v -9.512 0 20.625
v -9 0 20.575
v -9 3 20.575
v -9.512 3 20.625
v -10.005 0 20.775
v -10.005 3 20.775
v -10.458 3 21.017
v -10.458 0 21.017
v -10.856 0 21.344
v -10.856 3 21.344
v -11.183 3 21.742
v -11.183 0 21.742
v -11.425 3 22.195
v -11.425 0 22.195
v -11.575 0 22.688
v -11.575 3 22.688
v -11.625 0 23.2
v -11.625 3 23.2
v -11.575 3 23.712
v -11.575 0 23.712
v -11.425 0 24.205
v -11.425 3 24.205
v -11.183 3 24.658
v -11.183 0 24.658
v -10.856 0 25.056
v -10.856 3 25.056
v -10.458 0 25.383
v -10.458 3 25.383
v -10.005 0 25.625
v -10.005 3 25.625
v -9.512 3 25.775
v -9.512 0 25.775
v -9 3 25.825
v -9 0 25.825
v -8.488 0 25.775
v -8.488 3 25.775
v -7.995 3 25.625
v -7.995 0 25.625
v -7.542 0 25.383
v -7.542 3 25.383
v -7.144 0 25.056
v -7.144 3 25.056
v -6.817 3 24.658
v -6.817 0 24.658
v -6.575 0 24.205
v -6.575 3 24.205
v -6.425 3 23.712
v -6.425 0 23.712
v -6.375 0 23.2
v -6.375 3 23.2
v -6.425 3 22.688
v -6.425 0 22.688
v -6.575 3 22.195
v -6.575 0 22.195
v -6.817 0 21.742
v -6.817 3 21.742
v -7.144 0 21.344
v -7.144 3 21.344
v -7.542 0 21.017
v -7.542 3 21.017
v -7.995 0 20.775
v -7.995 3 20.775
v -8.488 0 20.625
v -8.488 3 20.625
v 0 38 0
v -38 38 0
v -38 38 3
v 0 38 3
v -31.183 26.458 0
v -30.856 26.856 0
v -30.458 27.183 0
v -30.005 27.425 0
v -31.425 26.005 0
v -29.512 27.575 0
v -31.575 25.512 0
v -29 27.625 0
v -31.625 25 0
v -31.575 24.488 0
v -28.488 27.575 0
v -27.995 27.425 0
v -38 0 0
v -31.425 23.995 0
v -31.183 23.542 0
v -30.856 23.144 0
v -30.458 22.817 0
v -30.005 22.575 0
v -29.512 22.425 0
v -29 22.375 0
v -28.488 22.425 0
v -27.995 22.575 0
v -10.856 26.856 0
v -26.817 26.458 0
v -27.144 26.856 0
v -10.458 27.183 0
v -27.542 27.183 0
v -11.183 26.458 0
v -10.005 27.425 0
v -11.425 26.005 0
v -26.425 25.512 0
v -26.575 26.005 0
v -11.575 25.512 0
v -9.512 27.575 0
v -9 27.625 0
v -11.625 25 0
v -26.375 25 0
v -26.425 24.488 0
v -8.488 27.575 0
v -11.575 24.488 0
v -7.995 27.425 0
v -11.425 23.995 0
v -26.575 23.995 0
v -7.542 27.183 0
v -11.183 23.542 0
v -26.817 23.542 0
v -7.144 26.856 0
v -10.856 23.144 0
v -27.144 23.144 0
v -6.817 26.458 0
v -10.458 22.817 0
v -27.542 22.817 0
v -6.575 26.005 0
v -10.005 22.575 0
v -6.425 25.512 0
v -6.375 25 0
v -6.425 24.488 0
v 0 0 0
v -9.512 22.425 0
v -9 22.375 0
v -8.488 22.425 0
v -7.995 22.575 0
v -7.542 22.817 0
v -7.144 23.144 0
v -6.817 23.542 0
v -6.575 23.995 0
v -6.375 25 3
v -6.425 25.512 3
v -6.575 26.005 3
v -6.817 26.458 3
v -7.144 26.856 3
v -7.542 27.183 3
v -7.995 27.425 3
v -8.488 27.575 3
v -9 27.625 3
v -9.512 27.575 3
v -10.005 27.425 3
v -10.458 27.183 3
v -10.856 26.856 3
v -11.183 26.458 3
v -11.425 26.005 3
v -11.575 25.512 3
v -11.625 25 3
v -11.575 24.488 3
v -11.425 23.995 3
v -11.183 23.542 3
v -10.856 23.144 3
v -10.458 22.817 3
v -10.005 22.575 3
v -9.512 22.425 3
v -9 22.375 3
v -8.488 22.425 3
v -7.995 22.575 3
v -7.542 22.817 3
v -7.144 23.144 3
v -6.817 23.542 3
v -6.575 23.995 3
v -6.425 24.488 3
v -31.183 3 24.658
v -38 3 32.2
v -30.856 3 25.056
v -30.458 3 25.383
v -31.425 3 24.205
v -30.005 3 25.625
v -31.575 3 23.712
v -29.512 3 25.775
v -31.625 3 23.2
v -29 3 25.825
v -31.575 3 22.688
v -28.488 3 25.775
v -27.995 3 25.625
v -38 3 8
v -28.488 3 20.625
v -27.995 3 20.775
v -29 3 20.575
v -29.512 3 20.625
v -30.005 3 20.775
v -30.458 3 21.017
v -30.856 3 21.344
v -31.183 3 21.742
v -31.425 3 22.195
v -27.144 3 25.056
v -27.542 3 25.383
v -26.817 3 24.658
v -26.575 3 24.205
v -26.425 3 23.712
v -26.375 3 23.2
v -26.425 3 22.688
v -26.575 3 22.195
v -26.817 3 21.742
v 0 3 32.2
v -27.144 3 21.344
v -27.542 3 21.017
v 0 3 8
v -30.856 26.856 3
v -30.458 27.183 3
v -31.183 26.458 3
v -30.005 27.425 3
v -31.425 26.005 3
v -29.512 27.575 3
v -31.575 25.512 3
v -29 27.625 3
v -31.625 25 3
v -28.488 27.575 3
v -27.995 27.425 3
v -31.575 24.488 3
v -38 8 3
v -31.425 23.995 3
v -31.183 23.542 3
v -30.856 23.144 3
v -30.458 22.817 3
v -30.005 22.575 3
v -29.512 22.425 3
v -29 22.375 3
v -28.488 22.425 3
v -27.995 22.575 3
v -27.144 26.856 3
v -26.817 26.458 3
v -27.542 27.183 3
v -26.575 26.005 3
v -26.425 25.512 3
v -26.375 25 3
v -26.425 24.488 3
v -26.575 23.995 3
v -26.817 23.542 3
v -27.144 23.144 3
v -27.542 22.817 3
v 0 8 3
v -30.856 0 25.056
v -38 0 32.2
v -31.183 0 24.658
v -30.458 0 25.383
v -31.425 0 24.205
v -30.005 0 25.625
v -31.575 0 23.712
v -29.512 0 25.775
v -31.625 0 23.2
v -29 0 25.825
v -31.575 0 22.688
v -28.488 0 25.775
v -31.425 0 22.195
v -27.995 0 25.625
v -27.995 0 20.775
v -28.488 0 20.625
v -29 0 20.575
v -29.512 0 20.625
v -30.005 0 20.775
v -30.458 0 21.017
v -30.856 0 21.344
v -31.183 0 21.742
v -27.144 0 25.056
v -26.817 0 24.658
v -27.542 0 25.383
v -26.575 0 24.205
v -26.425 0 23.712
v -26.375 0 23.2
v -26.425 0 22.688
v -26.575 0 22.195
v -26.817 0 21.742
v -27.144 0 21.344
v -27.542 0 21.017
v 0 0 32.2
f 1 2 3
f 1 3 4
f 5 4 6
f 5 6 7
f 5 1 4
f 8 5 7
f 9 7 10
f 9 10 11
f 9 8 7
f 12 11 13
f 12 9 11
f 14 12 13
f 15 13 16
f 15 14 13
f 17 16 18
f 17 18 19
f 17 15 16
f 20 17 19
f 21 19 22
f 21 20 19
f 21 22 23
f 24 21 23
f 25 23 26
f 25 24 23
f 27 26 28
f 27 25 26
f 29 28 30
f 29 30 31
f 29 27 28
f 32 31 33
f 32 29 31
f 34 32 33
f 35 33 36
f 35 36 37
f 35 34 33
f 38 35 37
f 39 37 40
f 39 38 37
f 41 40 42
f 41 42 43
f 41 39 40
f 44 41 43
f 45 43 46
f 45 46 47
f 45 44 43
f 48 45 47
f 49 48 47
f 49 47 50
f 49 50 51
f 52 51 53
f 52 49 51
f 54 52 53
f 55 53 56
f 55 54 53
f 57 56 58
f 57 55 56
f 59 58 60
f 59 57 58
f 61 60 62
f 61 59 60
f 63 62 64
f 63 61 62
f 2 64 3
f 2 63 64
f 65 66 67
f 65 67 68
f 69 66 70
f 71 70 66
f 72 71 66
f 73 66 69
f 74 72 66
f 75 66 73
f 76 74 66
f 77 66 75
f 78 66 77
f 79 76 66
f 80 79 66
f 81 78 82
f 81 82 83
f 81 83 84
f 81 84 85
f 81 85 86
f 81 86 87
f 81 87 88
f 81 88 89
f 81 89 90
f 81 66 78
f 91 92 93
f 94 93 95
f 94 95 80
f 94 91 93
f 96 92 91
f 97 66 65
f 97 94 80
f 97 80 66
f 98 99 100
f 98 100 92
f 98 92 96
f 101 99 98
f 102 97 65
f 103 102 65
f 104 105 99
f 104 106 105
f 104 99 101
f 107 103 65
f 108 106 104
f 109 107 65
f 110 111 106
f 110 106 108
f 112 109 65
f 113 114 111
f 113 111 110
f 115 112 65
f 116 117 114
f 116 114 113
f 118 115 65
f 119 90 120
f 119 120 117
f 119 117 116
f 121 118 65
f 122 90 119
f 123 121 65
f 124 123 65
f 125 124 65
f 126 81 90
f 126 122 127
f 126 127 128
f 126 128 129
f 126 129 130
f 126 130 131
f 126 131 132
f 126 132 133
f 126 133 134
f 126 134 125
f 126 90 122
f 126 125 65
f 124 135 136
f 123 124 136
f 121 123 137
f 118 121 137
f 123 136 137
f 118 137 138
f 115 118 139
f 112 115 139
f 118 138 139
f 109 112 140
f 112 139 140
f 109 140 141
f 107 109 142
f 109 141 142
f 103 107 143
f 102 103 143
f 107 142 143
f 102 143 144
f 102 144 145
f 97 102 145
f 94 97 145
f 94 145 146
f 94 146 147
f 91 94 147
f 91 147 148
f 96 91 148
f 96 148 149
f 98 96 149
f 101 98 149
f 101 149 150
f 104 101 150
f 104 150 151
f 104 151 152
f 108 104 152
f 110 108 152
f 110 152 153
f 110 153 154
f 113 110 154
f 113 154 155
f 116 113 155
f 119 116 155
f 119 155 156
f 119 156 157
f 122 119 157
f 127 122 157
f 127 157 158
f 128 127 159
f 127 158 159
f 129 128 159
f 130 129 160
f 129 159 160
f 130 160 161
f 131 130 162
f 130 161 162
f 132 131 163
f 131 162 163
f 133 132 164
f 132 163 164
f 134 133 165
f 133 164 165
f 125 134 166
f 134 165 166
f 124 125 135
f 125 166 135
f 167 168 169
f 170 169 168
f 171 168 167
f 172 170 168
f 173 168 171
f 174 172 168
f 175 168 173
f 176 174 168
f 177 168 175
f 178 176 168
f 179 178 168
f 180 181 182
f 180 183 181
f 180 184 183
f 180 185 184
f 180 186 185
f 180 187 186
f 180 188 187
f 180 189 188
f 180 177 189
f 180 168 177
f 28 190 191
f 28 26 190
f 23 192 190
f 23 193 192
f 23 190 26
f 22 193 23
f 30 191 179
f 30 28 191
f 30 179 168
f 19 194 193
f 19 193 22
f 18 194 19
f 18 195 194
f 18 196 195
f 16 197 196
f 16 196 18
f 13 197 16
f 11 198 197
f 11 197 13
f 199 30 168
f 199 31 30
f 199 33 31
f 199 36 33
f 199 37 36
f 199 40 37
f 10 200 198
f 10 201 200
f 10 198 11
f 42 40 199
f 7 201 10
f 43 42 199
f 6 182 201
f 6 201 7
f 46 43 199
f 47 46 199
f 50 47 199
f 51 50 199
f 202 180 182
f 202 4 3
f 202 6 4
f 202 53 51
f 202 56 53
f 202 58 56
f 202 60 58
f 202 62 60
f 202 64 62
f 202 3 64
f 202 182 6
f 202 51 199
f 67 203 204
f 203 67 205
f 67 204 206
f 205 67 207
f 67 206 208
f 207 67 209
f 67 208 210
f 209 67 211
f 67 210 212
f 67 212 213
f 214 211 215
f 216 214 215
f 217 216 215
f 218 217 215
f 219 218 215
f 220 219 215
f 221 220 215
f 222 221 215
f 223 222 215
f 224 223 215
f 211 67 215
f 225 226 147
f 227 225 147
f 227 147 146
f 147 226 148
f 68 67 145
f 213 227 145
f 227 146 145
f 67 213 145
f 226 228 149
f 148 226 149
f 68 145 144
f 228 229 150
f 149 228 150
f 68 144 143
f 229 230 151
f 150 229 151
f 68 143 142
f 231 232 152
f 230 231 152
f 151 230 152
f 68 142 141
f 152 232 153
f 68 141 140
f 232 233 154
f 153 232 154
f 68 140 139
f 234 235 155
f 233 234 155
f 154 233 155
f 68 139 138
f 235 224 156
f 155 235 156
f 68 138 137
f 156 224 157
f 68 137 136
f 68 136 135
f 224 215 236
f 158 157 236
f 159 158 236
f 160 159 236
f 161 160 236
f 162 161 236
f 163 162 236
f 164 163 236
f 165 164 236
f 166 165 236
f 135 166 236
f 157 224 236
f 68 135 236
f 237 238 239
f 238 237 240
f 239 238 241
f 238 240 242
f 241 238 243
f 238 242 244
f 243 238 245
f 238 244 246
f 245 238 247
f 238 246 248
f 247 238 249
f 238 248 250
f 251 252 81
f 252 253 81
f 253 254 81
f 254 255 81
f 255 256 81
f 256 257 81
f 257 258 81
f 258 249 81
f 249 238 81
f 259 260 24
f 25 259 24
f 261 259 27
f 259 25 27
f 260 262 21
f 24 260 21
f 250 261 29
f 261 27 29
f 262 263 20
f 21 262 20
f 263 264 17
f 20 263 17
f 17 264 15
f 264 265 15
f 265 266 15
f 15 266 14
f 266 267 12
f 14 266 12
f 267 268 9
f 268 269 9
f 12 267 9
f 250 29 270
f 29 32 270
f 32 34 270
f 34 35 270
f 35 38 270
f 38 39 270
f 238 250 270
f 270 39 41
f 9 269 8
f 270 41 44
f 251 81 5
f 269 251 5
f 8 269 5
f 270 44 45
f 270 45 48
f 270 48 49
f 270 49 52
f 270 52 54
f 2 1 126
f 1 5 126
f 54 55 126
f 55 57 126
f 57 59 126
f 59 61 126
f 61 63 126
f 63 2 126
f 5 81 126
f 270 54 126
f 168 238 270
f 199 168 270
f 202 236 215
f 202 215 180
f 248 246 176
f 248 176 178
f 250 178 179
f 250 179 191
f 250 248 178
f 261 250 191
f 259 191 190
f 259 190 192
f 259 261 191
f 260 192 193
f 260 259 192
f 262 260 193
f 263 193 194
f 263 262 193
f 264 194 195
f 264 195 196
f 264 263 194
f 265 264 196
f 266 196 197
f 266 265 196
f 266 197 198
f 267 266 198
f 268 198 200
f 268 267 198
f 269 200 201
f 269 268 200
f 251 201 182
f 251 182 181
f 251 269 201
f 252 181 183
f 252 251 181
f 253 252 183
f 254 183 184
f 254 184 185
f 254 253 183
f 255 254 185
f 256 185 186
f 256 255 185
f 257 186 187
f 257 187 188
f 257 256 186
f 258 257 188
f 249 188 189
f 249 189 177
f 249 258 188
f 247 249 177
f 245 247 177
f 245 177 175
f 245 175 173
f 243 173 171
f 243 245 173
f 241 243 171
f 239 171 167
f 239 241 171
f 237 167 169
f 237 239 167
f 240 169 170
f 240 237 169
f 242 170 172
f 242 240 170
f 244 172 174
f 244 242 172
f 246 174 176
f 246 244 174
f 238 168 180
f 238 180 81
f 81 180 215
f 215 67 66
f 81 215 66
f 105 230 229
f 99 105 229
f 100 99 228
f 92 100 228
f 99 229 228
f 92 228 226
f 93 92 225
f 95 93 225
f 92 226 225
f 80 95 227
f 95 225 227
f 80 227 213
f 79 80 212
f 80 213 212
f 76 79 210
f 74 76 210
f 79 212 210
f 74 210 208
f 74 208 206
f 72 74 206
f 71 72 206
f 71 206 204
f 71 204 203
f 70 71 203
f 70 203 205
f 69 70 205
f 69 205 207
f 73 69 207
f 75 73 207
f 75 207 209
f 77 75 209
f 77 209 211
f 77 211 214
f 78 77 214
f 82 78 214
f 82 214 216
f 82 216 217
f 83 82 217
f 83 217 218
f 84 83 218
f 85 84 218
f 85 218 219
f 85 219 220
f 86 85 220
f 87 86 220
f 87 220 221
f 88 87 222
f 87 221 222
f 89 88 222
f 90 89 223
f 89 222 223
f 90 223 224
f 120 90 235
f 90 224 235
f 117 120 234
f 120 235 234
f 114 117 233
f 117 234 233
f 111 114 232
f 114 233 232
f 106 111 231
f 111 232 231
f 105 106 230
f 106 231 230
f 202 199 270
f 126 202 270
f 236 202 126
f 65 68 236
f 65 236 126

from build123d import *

# Parameters (mm, degrees)
SKETCH1_W           = 38
SKETCH1_H           = 32.2
SKETCH1_R           = 2.625
BOSS_EXTRUDE1_DEPTH = 3
SKETCH2_W           = 38
SKETCH2_H           = 3
BOSS_EXTRUDE2_DEPTH = 35
SKETCH3_R           = 2.625
CUT_EXTRUDE1_DEPTH  = 62.160771741
BOSS_EXTRUDE3_DEPTH = 38


with BuildPart() as part:
    # Sketch1 → Boss-Extrude1 (new body)
    with BuildSketch(Plane(origin=(0, 0, 0), x_dir=(1, 0, 0), z_dir=(0, 1, 0))):
        with Locations((-19, -16.1)):
            Rectangle(SKETCH1_W, SKETCH1_H)
        with Locations(Location((-29, -23.2, 0), (0, 0, 270))):
            Circle(SKETCH1_R, mode=Mode.SUBTRACT)
        with Locations(Location((-9, -23.2, 0), (0, 0, 90))):
            Circle(SKETCH1_R, mode=Mode.SUBTRACT)
    extrude(amount=BOSS_EXTRUDE1_DEPTH)

    # Sketch2 → Boss-Extrude2 (add)
    with BuildSketch(Plane(origin=(0, 3, 0), x_dir=(1, 0, 0), z_dir=(0, 1, 0))):
        with Locations((-19, -1.5)):
            Rectangle(SKETCH2_W, SKETCH2_H)
    extrude(amount=BOSS_EXTRUDE2_DEPTH)

    # Sketch3 → Cut-Extrude1 (cut, through all)
    with BuildSketch(Plane.XY.offset(3)):
        with Locations((-29, 25)):
            Circle(SKETCH3_R)
        with Locations((-9, 25)):
            Circle(SKETCH3_R)
    extrude(amount=-CUT_EXTRUDE1_DEPTH, mode=Mode.SUBTRACT)

    # Sketch4 → Boss-Extrude3 (add, through all)
    with BuildSketch(Plane(origin=(0, 0, 0), x_dir=(0, 0, -1), z_dir=(1, 0, 0))):
        Polygon((-3, 8), (-8, 3), (-3, 3), align=None)
    extrude(amount=-BOSS_EXTRUDE3_DEPTH)


solid = part.part
